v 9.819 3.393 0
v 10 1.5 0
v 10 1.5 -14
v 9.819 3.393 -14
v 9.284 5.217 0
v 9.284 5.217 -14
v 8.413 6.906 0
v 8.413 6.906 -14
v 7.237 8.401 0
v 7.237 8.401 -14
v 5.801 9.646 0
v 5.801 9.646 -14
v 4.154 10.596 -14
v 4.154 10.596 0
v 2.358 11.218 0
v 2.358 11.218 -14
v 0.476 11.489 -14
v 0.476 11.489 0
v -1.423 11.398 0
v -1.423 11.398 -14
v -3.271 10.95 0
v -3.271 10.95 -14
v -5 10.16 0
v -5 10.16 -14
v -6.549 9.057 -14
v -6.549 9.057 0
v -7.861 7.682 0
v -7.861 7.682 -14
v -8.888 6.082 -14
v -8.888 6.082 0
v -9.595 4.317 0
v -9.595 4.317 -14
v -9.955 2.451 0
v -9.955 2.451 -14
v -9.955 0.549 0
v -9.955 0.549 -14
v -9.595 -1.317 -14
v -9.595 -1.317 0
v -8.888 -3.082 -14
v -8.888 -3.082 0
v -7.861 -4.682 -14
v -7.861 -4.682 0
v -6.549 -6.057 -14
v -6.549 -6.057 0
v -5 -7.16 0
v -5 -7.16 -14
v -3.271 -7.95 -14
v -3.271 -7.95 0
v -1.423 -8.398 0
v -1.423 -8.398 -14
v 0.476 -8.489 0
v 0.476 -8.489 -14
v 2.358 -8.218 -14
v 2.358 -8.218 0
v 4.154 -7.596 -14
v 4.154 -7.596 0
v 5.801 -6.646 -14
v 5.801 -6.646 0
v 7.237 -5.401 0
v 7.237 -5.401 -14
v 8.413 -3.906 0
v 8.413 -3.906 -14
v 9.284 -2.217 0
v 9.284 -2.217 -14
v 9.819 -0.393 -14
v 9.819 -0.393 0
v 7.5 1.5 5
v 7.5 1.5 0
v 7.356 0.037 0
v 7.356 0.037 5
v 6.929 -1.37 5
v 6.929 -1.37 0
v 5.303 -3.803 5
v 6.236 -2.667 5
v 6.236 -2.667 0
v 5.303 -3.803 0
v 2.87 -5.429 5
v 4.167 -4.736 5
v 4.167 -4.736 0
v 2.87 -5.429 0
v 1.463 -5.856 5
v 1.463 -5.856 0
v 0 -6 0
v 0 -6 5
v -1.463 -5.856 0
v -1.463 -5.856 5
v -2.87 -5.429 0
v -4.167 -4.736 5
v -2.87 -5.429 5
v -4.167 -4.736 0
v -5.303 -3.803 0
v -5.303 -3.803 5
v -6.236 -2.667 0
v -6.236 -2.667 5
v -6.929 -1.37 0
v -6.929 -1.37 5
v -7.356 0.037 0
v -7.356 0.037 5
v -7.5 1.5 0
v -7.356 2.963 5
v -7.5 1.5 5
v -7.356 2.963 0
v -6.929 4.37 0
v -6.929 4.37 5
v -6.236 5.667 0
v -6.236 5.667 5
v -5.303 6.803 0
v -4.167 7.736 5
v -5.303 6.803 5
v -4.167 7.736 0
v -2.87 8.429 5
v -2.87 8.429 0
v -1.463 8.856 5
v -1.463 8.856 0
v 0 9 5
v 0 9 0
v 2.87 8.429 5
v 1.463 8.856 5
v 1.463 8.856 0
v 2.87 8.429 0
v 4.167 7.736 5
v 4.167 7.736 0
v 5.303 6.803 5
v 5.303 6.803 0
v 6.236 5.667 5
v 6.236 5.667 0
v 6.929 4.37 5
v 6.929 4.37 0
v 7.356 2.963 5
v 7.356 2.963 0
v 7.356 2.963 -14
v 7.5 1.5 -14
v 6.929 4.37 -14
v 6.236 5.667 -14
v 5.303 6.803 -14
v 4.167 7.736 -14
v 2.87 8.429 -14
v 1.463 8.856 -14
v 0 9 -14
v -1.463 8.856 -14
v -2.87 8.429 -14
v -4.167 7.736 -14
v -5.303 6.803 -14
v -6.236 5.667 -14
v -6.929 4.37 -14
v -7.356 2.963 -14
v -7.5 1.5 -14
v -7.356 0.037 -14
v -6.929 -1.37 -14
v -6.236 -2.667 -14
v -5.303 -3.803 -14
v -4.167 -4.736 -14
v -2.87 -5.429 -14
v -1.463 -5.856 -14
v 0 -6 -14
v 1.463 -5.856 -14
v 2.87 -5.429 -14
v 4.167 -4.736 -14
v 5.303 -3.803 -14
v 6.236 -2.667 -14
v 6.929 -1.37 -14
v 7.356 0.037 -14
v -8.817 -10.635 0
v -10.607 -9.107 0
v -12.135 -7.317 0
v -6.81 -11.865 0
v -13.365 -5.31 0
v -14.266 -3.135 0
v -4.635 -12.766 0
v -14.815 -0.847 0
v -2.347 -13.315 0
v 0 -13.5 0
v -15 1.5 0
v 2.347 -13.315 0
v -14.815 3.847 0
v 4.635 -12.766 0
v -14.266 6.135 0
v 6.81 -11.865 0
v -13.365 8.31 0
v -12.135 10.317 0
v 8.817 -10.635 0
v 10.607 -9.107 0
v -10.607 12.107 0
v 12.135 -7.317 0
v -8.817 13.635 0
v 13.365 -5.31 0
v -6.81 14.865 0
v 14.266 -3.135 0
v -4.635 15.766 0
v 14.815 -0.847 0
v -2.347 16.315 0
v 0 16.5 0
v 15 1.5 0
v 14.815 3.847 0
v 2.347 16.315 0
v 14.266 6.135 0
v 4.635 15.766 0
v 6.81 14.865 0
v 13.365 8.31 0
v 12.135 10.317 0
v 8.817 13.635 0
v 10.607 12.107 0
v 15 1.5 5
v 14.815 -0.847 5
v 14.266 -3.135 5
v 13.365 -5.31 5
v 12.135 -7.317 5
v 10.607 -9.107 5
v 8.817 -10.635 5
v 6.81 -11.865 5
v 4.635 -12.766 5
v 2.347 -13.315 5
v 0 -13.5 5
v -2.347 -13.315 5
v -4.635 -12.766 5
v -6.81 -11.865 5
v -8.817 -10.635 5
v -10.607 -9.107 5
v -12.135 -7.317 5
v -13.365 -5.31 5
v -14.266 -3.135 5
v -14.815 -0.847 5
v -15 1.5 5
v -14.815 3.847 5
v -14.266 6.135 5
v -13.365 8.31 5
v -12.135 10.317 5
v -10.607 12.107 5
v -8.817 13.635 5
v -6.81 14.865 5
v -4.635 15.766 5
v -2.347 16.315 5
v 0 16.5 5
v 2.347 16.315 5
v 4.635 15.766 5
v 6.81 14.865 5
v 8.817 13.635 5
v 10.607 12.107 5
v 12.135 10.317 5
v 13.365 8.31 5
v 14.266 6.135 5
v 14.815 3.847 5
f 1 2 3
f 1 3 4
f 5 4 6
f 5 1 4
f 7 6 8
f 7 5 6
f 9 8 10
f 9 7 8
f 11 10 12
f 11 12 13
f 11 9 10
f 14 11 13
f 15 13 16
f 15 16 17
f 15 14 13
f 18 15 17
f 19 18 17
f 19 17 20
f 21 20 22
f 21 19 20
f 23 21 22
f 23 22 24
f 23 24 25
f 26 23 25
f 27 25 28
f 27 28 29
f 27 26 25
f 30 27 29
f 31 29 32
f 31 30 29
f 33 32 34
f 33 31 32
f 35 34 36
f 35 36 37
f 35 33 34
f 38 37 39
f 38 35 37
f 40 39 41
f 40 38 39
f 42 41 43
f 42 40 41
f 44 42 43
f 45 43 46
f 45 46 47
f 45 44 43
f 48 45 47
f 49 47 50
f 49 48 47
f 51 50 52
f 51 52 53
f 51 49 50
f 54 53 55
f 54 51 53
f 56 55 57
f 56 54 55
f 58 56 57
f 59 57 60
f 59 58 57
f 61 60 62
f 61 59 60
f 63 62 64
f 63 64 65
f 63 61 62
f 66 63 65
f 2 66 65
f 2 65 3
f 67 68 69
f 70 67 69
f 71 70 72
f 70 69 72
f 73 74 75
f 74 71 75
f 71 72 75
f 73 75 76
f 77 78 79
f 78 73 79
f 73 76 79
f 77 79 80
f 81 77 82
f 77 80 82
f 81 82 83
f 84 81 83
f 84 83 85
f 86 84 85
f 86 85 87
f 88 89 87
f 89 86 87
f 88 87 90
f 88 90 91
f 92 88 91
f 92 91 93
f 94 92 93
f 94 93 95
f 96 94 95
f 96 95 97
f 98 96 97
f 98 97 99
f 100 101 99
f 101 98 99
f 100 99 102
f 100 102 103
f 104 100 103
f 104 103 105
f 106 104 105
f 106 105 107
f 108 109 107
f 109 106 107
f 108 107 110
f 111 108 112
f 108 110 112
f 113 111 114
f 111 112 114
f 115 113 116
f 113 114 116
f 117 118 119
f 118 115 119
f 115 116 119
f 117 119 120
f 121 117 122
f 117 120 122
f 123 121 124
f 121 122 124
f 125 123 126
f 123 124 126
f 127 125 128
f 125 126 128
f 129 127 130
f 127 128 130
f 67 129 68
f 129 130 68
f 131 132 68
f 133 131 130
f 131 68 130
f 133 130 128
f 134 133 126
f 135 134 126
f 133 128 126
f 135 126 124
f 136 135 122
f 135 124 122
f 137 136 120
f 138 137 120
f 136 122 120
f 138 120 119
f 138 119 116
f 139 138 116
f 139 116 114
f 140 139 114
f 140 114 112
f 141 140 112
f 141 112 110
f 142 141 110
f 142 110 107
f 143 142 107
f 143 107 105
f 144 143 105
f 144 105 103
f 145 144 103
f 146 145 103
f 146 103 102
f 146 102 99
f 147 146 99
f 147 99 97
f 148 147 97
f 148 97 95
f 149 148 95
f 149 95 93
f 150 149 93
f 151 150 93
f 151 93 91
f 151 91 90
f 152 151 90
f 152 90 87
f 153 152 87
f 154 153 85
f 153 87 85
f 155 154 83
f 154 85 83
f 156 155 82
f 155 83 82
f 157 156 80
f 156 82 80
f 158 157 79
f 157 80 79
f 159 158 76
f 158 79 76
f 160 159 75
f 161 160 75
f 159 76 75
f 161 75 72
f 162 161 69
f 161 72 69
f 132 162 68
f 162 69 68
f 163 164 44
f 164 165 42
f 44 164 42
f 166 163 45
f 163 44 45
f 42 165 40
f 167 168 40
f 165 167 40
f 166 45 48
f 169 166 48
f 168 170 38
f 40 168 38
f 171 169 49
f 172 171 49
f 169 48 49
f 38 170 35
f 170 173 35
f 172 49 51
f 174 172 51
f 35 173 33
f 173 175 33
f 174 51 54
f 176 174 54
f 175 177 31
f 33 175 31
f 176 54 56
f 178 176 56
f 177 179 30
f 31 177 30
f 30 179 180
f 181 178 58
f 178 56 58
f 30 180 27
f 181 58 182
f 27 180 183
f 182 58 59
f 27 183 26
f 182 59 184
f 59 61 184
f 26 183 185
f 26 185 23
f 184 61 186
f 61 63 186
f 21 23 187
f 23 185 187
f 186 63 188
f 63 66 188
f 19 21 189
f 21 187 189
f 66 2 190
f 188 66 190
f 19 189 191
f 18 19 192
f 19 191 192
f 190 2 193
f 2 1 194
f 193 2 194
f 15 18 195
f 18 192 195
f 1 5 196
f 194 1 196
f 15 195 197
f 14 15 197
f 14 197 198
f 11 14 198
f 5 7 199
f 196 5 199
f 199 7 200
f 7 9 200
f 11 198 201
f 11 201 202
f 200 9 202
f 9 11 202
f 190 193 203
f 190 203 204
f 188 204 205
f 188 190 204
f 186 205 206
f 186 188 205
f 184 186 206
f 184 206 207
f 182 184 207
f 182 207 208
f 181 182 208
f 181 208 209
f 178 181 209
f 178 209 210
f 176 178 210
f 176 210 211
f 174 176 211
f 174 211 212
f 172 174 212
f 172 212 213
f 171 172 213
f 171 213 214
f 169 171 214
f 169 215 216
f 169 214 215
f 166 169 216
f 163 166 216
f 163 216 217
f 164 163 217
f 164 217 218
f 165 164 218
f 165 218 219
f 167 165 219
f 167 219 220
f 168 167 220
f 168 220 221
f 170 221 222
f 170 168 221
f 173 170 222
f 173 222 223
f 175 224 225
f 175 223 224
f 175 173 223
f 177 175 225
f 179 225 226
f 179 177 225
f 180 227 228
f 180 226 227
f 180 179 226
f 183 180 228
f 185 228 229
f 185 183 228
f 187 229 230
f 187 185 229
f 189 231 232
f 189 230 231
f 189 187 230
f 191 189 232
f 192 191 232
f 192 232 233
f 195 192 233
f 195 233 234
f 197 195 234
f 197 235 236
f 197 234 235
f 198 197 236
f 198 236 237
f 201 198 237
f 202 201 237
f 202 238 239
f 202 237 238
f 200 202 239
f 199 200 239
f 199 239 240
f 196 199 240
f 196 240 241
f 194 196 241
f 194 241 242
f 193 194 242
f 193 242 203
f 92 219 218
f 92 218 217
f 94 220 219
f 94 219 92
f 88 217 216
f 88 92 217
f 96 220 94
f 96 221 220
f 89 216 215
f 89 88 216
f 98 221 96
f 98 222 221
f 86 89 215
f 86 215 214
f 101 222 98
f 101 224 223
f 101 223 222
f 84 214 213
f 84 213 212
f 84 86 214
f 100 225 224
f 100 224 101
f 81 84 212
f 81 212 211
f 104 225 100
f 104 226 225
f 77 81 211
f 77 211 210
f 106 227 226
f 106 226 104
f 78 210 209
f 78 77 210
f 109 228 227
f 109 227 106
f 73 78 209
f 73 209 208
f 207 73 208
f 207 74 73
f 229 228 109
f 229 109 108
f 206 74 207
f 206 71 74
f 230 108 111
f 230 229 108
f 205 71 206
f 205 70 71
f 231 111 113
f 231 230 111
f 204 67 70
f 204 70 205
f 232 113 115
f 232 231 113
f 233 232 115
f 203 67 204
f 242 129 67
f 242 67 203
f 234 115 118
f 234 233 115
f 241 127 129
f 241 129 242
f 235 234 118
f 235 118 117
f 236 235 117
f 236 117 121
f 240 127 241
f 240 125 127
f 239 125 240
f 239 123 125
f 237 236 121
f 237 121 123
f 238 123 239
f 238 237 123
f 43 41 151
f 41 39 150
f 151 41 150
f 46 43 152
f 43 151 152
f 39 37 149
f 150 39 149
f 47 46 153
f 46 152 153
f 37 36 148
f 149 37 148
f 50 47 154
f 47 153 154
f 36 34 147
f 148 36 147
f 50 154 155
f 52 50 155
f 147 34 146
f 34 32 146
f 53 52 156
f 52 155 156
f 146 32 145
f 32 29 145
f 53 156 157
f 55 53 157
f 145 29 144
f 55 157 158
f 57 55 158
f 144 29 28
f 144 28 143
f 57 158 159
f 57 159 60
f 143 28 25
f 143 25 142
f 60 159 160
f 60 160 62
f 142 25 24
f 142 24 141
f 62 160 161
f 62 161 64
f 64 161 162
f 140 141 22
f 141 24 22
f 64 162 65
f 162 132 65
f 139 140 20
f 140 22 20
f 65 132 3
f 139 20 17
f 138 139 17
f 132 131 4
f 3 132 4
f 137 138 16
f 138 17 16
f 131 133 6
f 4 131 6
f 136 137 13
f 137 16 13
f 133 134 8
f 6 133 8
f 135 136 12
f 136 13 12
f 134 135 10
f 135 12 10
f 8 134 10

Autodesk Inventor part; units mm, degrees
ref_plane "YZ Plane" through (0, 0, 0) normal (1, 0, 0) x (0, 1, 0)
sketch "Sketch1" plane through (0, 0, 0) normal (0, 0, 1) x (1, 0, 0)
  circle A0 centre (0, 1.5) radius 10 projected
  circle A1 centre (0, 1.5) radius 10 projected
  circle A2 centre (0, 1.5) radius 15
  circle A3 centre (0, 1.5) radius 7.5
  point P0 (0, 0)
  dimension "d0" = 30
  dimension "d1" = 15
ref_plane "Work Plane1" through (-46.5047, -36.7959, -17) normal (0, 0, -1) x (0, 1, 0)
ref_plane "Work Plane2" through (-46.5047, -36.7959, -14) normal (0, 0, -1) x (0, 1, 0)
extrude "Extrusion1" add sketch "Sketch1" against normal up to surface (14 mm away) contours A0
sketch "Sketch2" plane through (0, 1.5, 0) normal (0, 0, 1) x (1, 0, 0)
  circle A0 centre (0, 0) radius 10 projected
  circle A1 centre (0, 0) radius 7.5 projected
  circle A2 centre (0, 0) radius 15
  point P0 (0, -1.5)
  dimension "d4" = 30
extrude "Extrusion2" add sketch "Sketch2" along normal blind 5 contours A0 | A2
properties part number "glide lejre bushing" material "Brass, Soft Yellow"
